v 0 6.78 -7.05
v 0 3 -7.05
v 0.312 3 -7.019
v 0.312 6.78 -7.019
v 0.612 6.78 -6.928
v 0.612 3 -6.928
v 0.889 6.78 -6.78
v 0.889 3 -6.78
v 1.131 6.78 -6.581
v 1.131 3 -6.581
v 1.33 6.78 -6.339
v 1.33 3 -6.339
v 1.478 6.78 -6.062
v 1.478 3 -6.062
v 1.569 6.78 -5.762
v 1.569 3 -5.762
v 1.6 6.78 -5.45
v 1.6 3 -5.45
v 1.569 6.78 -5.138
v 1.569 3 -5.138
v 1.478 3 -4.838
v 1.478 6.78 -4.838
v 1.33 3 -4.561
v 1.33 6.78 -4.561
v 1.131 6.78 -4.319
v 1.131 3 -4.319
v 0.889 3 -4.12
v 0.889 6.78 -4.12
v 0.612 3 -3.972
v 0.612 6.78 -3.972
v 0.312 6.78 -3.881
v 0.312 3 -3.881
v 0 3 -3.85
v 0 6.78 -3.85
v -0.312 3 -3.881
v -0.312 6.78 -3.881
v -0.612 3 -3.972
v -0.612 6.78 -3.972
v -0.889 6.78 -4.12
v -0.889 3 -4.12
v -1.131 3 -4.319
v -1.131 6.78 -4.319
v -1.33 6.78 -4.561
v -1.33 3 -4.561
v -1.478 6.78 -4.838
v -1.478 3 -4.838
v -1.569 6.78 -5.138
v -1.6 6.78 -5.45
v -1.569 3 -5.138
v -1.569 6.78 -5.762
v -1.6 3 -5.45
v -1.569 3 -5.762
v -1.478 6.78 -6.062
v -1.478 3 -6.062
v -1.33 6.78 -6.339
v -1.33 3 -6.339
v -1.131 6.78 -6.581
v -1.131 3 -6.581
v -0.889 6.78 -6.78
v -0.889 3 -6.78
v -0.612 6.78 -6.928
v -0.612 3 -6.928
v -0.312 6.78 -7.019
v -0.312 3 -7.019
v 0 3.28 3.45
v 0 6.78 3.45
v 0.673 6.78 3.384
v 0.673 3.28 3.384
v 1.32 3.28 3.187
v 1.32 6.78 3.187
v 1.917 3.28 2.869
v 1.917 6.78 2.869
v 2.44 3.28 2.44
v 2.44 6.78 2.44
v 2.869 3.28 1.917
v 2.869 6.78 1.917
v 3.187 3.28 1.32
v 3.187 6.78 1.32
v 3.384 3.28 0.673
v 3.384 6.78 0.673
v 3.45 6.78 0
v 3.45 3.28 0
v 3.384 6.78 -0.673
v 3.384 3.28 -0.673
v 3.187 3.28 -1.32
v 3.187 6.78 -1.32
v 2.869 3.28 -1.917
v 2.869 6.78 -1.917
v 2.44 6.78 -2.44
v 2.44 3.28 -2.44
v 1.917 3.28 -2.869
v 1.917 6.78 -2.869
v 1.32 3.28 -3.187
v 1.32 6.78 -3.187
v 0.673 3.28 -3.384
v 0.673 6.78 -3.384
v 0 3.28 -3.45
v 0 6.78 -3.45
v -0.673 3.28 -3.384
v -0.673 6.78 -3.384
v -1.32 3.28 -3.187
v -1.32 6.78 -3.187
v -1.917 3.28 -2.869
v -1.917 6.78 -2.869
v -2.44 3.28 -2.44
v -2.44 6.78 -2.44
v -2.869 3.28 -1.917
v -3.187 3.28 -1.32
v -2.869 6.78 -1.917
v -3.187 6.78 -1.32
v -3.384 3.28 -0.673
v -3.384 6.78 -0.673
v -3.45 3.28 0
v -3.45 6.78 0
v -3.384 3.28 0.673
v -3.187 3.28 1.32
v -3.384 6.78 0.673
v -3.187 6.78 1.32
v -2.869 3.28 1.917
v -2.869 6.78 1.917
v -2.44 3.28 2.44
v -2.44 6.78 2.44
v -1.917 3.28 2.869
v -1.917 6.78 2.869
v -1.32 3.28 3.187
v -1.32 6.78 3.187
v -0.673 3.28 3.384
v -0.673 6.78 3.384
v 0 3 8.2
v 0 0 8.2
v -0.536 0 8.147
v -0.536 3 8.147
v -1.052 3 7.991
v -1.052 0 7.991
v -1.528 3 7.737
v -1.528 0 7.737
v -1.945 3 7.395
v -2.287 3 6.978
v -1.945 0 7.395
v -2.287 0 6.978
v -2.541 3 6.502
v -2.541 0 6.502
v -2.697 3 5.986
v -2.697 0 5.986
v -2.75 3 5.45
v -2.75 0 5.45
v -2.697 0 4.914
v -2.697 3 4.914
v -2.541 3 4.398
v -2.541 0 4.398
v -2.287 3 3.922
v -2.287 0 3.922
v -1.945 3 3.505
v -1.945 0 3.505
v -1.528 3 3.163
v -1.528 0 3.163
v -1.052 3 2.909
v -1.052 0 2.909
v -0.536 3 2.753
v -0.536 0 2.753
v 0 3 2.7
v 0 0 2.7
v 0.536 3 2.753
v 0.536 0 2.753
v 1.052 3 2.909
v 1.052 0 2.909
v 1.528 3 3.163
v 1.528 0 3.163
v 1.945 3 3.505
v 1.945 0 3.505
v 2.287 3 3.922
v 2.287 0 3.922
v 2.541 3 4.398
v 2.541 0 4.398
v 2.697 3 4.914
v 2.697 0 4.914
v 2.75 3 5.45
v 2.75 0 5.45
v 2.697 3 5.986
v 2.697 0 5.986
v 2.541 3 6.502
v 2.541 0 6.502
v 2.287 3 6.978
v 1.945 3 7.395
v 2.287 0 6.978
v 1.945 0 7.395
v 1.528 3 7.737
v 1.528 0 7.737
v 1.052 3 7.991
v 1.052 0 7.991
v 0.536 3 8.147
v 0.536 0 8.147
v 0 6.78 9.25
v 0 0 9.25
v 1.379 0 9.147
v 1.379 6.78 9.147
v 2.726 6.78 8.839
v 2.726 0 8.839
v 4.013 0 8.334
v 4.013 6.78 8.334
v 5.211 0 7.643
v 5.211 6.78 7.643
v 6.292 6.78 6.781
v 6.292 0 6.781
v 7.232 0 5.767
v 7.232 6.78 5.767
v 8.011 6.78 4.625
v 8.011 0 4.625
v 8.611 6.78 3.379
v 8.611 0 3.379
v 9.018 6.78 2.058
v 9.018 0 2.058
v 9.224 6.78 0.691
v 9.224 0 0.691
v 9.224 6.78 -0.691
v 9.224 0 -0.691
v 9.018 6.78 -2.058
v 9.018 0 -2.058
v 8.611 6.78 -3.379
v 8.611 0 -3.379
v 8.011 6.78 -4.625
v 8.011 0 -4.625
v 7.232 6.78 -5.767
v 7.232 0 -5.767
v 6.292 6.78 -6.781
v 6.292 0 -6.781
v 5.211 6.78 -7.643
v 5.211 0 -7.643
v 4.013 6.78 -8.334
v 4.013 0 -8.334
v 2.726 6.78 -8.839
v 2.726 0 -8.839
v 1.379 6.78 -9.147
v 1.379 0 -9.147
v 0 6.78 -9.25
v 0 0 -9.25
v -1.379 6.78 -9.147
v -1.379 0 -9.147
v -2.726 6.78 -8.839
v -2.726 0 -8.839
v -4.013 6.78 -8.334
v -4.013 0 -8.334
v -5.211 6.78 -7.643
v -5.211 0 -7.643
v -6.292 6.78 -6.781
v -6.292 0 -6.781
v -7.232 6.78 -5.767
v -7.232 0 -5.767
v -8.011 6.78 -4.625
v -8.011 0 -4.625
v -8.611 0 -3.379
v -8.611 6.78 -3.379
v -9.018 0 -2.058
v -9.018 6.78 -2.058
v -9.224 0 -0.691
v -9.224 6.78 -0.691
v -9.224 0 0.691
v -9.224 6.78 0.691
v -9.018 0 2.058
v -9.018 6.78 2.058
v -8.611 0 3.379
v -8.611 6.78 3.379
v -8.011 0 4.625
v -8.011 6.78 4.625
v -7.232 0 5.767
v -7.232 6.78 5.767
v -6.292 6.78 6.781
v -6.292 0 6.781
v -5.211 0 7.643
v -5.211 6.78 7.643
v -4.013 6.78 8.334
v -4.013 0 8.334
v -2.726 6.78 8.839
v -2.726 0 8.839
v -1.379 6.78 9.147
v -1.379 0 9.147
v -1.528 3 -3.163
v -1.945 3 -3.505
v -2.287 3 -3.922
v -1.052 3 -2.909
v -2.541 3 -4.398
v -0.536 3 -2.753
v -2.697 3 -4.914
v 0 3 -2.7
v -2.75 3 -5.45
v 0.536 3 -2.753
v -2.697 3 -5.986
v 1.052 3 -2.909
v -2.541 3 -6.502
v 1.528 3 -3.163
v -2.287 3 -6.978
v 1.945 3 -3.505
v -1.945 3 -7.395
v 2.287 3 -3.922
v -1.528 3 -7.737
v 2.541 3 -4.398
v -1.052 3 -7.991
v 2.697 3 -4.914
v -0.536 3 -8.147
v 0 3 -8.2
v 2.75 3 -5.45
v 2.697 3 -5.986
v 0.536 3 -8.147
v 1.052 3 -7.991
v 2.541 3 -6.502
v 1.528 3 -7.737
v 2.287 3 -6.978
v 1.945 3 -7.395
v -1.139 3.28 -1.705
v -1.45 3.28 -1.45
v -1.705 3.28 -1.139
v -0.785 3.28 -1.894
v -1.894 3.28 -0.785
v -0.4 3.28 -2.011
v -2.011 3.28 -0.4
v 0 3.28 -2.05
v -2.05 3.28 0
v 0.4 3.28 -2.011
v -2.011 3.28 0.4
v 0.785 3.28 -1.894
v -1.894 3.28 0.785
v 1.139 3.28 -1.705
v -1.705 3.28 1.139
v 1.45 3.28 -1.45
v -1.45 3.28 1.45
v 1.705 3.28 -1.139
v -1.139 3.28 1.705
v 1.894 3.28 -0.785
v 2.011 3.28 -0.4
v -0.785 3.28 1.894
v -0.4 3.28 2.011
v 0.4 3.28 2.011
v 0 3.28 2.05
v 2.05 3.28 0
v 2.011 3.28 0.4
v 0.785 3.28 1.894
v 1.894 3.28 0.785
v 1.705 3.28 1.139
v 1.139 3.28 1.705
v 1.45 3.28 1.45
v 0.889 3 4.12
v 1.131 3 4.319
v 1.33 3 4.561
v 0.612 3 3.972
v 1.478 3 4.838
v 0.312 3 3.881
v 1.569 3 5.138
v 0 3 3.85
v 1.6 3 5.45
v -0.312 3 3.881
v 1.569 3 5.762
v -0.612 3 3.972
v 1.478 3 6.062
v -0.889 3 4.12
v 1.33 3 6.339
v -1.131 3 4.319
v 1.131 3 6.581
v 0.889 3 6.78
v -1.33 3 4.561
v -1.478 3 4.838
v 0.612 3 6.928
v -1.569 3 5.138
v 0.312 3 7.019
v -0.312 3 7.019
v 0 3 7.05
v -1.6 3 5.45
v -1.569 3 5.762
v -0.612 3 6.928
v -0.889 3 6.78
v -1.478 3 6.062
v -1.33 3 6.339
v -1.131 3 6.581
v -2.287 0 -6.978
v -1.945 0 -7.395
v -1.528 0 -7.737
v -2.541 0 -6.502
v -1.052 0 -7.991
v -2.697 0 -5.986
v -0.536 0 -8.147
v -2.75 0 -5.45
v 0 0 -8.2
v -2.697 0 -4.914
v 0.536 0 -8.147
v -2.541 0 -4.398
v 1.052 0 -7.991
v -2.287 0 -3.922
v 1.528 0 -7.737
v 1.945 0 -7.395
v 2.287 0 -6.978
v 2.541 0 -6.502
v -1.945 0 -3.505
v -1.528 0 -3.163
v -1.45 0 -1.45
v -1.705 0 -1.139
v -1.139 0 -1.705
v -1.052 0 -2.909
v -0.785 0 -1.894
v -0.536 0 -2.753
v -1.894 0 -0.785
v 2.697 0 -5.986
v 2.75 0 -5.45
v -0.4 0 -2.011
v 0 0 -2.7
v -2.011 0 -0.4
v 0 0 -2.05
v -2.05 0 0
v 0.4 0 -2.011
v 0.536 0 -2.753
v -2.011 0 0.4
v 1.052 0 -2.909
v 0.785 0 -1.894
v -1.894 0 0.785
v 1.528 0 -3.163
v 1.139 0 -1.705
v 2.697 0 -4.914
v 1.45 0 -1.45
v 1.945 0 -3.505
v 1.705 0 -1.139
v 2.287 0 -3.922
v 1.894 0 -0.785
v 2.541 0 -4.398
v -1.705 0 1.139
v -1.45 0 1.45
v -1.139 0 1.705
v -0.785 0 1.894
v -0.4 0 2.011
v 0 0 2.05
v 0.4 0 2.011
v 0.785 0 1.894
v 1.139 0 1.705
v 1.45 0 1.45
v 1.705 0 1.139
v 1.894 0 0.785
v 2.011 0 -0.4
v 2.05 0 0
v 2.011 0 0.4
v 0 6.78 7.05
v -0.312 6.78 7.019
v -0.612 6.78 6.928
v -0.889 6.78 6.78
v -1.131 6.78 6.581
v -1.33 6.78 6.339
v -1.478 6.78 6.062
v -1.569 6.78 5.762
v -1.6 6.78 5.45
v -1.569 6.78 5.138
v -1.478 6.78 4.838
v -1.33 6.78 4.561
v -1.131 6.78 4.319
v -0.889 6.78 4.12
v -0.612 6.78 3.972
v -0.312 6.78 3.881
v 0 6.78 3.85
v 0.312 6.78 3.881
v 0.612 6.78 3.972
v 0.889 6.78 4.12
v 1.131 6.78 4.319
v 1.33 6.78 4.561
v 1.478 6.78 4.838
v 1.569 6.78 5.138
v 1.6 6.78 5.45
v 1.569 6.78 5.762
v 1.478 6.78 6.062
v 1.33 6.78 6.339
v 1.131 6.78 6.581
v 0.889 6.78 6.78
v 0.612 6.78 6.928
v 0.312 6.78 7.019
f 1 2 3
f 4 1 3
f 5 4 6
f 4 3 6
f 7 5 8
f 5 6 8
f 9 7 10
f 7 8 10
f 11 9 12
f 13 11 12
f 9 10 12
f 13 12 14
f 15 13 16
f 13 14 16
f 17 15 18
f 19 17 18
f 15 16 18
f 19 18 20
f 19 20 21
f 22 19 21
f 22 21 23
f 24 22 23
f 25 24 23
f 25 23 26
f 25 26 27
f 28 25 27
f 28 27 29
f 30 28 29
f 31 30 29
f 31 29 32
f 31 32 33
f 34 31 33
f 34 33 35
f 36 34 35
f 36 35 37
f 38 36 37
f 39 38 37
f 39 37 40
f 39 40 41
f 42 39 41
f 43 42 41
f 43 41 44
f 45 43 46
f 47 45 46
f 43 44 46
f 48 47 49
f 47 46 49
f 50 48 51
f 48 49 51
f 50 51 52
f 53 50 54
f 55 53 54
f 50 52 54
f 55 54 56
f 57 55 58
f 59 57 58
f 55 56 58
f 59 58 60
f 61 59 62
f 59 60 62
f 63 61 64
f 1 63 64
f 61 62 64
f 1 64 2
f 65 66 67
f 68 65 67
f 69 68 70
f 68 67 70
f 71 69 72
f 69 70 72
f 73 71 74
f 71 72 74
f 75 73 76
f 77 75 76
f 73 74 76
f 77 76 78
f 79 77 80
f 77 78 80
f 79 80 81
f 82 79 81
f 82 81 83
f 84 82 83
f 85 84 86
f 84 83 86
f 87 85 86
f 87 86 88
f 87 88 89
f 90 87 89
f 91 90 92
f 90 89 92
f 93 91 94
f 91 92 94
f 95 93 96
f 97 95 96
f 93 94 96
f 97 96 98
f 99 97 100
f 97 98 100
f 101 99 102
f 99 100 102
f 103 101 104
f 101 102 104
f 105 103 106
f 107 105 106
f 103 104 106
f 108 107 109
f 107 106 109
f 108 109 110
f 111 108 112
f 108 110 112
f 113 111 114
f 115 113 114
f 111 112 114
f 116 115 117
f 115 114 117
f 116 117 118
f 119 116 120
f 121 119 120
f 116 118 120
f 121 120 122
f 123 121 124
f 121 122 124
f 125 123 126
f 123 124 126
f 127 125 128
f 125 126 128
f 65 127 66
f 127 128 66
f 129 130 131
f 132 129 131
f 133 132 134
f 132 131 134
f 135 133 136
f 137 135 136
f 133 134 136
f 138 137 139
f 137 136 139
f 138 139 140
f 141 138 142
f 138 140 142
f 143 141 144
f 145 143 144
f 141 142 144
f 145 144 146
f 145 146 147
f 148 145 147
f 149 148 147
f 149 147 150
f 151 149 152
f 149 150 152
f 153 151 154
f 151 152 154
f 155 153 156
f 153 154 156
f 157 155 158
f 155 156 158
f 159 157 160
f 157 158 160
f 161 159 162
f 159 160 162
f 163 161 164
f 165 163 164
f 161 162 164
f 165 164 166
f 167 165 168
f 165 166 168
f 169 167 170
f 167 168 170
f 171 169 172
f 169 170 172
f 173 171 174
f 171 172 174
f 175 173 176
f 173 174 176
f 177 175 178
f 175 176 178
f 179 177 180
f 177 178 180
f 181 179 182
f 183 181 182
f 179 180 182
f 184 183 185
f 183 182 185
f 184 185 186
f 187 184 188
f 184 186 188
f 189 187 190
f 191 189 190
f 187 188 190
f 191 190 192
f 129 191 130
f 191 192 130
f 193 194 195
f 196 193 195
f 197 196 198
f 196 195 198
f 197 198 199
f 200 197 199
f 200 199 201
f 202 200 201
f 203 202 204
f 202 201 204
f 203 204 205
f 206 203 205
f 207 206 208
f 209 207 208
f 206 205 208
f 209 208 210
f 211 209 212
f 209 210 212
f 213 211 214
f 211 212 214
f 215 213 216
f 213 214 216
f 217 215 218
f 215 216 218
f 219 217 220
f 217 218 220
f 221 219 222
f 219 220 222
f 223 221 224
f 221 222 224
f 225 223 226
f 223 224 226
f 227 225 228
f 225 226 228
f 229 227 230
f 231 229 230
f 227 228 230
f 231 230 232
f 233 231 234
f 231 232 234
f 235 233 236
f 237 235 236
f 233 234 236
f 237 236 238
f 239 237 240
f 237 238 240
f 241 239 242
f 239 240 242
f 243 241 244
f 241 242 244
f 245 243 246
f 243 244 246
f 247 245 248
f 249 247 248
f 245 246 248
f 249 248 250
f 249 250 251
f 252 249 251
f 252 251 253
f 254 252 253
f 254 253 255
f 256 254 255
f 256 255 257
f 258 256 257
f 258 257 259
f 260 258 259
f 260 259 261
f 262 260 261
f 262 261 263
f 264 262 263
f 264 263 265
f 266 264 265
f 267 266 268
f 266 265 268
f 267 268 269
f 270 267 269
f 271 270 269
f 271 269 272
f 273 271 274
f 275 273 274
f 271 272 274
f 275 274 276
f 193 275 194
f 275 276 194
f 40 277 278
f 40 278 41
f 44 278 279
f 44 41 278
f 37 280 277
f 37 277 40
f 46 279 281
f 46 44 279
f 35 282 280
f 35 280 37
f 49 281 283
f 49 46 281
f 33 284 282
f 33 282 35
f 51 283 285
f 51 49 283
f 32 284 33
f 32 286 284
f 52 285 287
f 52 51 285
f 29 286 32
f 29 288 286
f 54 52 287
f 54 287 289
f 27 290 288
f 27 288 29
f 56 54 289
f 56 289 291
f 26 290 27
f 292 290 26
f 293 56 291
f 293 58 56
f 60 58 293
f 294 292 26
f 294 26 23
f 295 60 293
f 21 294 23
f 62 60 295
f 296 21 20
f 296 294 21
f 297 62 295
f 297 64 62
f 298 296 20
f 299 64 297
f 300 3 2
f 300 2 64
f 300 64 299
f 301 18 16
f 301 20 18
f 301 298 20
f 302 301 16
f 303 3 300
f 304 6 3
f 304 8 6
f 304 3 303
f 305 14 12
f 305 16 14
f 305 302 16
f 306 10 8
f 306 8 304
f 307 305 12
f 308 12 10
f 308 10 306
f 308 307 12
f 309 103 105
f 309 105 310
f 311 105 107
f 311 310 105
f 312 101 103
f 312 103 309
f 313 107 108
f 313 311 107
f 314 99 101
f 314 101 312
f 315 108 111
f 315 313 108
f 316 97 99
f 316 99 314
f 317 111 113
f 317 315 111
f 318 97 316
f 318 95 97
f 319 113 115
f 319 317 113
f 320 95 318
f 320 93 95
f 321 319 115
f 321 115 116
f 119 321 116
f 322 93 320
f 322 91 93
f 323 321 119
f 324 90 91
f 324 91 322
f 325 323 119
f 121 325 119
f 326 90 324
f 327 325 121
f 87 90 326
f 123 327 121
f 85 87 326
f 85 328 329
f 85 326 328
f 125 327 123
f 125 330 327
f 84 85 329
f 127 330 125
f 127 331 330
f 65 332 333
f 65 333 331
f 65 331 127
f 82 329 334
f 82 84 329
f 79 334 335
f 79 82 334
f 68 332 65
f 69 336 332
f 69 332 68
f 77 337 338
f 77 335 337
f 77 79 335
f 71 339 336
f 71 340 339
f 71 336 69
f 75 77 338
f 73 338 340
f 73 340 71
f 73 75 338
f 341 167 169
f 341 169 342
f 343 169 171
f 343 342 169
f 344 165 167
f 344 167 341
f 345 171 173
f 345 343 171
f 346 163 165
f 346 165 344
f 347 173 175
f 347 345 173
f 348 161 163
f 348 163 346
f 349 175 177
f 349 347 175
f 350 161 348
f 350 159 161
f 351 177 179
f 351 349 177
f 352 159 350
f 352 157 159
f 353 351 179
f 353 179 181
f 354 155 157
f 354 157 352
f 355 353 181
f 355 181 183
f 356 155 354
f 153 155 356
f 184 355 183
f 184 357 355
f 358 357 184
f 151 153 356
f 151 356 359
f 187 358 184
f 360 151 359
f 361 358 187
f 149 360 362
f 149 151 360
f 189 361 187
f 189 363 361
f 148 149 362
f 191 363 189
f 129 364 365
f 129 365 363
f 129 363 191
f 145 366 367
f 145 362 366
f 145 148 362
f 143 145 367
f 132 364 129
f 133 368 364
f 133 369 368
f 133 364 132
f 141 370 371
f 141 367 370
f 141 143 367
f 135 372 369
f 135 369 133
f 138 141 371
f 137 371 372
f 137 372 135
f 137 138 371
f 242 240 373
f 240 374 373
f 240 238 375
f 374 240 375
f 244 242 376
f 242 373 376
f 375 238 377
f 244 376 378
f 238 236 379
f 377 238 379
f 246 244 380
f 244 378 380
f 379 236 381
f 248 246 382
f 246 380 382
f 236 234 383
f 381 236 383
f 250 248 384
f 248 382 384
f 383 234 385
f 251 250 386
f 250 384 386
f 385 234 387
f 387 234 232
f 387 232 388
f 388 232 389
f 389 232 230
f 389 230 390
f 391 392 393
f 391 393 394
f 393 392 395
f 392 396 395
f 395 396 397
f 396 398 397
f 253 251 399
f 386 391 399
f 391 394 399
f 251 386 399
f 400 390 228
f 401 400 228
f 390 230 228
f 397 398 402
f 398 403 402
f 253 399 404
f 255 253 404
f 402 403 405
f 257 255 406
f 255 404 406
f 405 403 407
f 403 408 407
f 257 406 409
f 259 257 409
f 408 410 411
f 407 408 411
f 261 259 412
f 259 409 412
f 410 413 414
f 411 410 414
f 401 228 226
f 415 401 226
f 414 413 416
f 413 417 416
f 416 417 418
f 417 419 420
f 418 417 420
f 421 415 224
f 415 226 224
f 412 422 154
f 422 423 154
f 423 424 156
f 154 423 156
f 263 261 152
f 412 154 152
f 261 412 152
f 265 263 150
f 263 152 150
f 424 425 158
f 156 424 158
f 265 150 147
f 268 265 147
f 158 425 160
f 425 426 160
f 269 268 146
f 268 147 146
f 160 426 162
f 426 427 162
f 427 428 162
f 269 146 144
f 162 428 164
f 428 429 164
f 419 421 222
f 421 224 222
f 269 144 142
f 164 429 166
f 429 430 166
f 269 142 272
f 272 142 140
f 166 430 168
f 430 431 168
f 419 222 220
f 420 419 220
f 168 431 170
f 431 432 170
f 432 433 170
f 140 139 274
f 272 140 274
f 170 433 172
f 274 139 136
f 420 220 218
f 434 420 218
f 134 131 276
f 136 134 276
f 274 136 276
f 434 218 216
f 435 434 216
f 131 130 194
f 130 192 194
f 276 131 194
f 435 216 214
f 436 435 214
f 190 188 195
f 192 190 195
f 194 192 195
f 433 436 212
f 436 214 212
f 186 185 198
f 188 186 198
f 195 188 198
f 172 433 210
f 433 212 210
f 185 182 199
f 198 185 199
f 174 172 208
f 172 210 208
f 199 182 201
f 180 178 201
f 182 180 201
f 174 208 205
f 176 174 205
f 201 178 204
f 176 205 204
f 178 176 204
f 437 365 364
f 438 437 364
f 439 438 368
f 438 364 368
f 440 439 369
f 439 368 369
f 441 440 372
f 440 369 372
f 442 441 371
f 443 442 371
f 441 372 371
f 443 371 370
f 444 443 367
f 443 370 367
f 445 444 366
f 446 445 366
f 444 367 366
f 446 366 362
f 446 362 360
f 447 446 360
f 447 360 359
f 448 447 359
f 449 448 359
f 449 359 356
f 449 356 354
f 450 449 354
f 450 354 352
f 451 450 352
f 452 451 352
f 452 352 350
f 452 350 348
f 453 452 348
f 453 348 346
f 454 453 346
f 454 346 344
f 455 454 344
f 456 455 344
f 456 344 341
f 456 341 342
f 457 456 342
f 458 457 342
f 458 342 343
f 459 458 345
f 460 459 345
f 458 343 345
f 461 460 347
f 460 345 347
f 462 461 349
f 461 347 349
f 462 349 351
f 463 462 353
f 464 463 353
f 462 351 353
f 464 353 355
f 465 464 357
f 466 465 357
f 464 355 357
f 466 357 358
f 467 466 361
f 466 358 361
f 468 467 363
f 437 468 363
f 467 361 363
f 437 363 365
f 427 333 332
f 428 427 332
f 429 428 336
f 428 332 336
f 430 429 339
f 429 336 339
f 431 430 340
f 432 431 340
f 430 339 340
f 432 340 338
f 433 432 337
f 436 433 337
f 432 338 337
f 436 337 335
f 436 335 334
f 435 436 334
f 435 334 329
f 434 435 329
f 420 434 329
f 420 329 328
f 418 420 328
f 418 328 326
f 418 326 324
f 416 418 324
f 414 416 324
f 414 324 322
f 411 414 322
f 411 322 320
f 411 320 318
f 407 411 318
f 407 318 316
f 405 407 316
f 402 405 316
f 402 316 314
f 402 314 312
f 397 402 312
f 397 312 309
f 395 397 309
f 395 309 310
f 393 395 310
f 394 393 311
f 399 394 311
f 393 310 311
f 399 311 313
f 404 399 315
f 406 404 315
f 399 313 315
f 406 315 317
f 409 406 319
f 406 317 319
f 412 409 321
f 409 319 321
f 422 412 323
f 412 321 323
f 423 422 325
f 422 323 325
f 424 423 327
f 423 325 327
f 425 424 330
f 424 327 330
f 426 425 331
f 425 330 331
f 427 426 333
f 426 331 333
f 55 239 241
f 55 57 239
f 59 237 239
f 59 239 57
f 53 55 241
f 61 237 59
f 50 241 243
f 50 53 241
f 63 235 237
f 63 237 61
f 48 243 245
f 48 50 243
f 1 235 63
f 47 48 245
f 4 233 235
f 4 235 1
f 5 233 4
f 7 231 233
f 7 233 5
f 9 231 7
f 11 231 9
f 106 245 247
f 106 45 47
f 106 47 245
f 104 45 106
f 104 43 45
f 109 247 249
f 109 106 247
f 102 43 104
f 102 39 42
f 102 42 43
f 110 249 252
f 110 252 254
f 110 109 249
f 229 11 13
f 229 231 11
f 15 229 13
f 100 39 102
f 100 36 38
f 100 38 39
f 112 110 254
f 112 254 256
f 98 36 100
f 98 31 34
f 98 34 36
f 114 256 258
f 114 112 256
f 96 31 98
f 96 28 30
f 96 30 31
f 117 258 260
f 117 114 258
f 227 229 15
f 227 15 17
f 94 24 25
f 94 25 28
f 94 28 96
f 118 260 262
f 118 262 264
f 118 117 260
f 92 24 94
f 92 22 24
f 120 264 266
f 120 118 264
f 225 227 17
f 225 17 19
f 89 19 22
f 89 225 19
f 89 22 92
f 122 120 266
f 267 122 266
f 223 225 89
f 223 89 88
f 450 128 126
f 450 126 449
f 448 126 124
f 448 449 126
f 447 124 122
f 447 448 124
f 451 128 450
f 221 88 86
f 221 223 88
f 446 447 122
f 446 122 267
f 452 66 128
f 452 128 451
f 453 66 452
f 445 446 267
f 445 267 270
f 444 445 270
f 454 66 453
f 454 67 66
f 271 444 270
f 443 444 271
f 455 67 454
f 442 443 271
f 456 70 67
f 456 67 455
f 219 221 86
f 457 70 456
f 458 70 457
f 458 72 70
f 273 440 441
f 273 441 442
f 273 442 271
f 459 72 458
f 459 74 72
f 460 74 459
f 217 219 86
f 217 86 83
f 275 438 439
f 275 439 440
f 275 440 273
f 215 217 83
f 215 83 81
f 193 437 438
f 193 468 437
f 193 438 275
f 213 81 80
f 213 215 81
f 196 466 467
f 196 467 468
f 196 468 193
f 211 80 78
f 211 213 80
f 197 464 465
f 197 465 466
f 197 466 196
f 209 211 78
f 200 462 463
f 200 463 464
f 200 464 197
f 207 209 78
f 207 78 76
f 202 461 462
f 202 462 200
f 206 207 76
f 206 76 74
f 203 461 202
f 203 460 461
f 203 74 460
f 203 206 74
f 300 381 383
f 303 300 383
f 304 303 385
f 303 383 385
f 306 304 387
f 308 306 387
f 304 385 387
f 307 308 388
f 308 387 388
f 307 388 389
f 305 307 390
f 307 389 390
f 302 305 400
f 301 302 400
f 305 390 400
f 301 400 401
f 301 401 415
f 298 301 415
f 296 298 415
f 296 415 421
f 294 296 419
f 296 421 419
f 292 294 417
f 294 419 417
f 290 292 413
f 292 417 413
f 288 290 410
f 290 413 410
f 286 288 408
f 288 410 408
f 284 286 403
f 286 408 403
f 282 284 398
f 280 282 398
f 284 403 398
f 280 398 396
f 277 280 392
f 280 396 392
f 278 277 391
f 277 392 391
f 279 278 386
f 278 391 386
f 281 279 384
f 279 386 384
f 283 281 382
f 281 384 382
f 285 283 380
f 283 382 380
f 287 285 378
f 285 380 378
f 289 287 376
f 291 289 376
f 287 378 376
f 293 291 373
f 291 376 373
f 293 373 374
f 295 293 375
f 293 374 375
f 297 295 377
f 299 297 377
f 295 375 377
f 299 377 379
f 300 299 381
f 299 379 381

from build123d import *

# Parameters (mm, degrees)
SKETCH1_R           = 9.25
BOSS_EXTRUDE1_DEPTH = 6.78
SKETCH2_R           = 2.05
CUT_EXTRUDE1_DEPTH  = 15.734089724
SKETCH3_R           = 3.45
CUT_EXTRUDE2_DEPTH  = 3.5
SKETCH4_R           = 1.6
CUT_EXTRUDE3_DEPTH  = 15.734089724
CIRPATTERN1_COUNT   = 2
SKETCH5_R           = 2.75
CUT_EXTRUDE4_DEPTH  = 3
CIRPATTERN2_COUNT   = 2


with BuildPart() as part:
    # Sketch1 → Boss-Extrude1 (new body)
    with BuildSketch(Plane(origin=(0, 0, 0), x_dir=(1, 0, 0), z_dir=(0, 1, 0))):
        with Locations(Location((0, 0, 0), (0, 0, 270))):
            Circle(SKETCH1_R)
    extrude(amount=BOSS_EXTRUDE1_DEPTH)

    # Sketch2 → Cut-Extrude1 (cut, through all)
    with BuildSketch(Plane(origin=(0, 6.78, 0), x_dir=(1, 0, 0), z_dir=(0, 1, 0))):
        with Locations(Location((0, 0, 0), (0, 0, 270))):
            Circle(SKETCH2_R)
    extrude(amount=-CUT_EXTRUDE1_DEPTH, mode=Mode.SUBTRACT)

    # Sketch3 → Cut-Extrude2 (cut)
    with BuildSketch(Plane(origin=(0, 6.78, 0), x_dir=(1, 0, 0), z_dir=(0, 1, 0))):
        with Locations(Location((0, 0, 0), (0, 0, 270))):
            Circle(SKETCH3_R)
    extrude(amount=-CUT_EXTRUDE2_DEPTH, mode=Mode.SUBTRACT)

    # Sketch4 → Cut-Extrude3 (cut, through all)
    with BuildSketch(Plane(origin=(0, 0, 0), x_dir=(-1, 0, 0), z_dir=(0, -1, 0))):
        with Locations(Location((0, 5.45, 0), (0, 0, 90))):
            Circle(SKETCH4_R)
    cut_extrude3 = extrude(amount=-CUT_EXTRUDE3_DEPTH, mode=Mode.SUBTRACT)

    # CirPattern1: Cut-Extrude3 ×2 about axis
    cirpattern1_axis = Axis((0, 0, 0), (0, 1, 0))
    for i in range(1, CIRPATTERN1_COUNT):
        add(cut_extrude3.rotate(cirpattern1_axis, i * 360 / CIRPATTERN1_COUNT), mode=Mode.SUBTRACT)

    # Sketch5 → Cut-Extrude4 (cut)
    with BuildSketch(Plane(origin=(0, 0, 0), x_dir=(-1, 0, 0), z_dir=(0, -1, 0))):
        with Locations(Location((0, 5.45, 0), (0, 0, 90))):
            Circle(SKETCH5_R)
    cut_extrude4 = extrude(amount=-CUT_EXTRUDE4_DEPTH, mode=Mode.SUBTRACT)

    # CirPattern2: Cut-Extrude4 ×2 about axis
    cirpattern2_axis = Axis((0, 0, 0), (0, 1, 0))
    for i in range(1, CIRPATTERN2_COUNT):
        add(cut_extrude4.rotate(cirpattern2_axis, i * 360 / CIRPATTERN2_COUNT), mode=Mode.SUBTRACT)


solid = part.part
